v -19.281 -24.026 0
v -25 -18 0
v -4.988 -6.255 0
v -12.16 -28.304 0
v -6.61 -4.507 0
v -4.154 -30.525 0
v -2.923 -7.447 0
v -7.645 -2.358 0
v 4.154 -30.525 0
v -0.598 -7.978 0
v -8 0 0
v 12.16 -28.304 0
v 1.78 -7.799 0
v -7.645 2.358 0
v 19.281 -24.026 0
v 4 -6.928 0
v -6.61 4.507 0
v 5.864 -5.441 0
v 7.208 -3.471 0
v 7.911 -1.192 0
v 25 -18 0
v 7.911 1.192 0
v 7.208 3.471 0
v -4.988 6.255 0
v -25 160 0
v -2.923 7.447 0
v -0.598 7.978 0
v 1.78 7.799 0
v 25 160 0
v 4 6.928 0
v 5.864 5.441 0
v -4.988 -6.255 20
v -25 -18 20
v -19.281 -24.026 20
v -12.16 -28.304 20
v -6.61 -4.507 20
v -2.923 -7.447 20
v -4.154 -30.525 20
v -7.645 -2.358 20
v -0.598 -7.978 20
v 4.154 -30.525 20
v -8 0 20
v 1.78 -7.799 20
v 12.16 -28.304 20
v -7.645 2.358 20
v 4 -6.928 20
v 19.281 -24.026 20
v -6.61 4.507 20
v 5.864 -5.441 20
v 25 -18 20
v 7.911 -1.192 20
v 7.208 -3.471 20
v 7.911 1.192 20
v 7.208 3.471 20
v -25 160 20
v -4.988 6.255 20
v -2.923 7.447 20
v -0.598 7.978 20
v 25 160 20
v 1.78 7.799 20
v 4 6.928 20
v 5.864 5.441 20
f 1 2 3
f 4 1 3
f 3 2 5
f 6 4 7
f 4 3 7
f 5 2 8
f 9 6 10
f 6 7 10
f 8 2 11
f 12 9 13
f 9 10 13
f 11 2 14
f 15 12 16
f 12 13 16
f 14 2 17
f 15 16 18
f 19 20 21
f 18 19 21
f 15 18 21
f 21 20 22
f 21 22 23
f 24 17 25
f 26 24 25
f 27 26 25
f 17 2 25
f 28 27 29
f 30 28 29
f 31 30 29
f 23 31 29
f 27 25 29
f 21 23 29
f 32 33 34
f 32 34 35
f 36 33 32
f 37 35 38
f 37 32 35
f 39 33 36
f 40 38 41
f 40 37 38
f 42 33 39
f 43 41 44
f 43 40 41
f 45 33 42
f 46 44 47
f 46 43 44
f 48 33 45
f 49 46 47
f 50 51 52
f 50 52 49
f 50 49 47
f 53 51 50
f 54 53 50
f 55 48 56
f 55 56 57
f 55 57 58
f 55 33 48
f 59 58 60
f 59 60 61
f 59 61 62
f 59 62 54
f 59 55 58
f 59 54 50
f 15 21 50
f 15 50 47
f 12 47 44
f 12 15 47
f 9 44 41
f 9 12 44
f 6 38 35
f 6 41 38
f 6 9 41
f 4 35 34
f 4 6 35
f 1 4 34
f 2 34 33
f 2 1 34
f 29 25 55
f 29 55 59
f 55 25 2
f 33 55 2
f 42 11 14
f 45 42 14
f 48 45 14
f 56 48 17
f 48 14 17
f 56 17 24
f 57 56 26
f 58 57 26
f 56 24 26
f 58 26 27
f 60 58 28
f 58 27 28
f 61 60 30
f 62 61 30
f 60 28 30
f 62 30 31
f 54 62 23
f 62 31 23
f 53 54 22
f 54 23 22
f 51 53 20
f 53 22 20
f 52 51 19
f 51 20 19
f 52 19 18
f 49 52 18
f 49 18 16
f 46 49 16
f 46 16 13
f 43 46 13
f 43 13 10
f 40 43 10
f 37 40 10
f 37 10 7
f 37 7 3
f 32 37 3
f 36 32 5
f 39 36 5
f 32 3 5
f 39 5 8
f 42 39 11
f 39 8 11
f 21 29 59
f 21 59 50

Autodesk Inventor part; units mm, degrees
ref_plane "YZ Plane" through (0, 0, 0) normal (1, 0, 0) x (0, 1, 0)
ref_plane "XZ Plane" through (0, 0, 0) normal (0, 1, 0) x (-1, 0, 0)
ref_plane "XY Plane" through (0, 0, 0) normal (0, 0, 1) x (1, 0, 0)
sketch "Sketch1" plane through (0, 0, 0) normal (0, 0, 1) x (1, 0, 0)
  line L0 (-25, 160) -> (25, 160)
  line L1 (25, 160) -> (25, -18)
  line L2 (-25, 160) -> (-25, -18)
  arc A0 (-25, -18) -> (25, -18) centre (0, 0) ccw
  dimension "d62" = 90
  dimension "d63" = 160
  dimension "d64" = 50
  dimension "d65" = 18
extrude "Extrusion1" add sketch "Sketch1" along normal blind 20
sketch "Sketch10" plane through (0, 0, 0) normal (0, 0, -1) x (-1, 0, 0)
  circle A0 centre (0, 0) radius 8
  dimension "d54" = 16
extrude "Extrusion7" cut sketch "Sketch10" against normal through all
properties part number "Throttle Arm" material "Aluminum 6061-AHC"
